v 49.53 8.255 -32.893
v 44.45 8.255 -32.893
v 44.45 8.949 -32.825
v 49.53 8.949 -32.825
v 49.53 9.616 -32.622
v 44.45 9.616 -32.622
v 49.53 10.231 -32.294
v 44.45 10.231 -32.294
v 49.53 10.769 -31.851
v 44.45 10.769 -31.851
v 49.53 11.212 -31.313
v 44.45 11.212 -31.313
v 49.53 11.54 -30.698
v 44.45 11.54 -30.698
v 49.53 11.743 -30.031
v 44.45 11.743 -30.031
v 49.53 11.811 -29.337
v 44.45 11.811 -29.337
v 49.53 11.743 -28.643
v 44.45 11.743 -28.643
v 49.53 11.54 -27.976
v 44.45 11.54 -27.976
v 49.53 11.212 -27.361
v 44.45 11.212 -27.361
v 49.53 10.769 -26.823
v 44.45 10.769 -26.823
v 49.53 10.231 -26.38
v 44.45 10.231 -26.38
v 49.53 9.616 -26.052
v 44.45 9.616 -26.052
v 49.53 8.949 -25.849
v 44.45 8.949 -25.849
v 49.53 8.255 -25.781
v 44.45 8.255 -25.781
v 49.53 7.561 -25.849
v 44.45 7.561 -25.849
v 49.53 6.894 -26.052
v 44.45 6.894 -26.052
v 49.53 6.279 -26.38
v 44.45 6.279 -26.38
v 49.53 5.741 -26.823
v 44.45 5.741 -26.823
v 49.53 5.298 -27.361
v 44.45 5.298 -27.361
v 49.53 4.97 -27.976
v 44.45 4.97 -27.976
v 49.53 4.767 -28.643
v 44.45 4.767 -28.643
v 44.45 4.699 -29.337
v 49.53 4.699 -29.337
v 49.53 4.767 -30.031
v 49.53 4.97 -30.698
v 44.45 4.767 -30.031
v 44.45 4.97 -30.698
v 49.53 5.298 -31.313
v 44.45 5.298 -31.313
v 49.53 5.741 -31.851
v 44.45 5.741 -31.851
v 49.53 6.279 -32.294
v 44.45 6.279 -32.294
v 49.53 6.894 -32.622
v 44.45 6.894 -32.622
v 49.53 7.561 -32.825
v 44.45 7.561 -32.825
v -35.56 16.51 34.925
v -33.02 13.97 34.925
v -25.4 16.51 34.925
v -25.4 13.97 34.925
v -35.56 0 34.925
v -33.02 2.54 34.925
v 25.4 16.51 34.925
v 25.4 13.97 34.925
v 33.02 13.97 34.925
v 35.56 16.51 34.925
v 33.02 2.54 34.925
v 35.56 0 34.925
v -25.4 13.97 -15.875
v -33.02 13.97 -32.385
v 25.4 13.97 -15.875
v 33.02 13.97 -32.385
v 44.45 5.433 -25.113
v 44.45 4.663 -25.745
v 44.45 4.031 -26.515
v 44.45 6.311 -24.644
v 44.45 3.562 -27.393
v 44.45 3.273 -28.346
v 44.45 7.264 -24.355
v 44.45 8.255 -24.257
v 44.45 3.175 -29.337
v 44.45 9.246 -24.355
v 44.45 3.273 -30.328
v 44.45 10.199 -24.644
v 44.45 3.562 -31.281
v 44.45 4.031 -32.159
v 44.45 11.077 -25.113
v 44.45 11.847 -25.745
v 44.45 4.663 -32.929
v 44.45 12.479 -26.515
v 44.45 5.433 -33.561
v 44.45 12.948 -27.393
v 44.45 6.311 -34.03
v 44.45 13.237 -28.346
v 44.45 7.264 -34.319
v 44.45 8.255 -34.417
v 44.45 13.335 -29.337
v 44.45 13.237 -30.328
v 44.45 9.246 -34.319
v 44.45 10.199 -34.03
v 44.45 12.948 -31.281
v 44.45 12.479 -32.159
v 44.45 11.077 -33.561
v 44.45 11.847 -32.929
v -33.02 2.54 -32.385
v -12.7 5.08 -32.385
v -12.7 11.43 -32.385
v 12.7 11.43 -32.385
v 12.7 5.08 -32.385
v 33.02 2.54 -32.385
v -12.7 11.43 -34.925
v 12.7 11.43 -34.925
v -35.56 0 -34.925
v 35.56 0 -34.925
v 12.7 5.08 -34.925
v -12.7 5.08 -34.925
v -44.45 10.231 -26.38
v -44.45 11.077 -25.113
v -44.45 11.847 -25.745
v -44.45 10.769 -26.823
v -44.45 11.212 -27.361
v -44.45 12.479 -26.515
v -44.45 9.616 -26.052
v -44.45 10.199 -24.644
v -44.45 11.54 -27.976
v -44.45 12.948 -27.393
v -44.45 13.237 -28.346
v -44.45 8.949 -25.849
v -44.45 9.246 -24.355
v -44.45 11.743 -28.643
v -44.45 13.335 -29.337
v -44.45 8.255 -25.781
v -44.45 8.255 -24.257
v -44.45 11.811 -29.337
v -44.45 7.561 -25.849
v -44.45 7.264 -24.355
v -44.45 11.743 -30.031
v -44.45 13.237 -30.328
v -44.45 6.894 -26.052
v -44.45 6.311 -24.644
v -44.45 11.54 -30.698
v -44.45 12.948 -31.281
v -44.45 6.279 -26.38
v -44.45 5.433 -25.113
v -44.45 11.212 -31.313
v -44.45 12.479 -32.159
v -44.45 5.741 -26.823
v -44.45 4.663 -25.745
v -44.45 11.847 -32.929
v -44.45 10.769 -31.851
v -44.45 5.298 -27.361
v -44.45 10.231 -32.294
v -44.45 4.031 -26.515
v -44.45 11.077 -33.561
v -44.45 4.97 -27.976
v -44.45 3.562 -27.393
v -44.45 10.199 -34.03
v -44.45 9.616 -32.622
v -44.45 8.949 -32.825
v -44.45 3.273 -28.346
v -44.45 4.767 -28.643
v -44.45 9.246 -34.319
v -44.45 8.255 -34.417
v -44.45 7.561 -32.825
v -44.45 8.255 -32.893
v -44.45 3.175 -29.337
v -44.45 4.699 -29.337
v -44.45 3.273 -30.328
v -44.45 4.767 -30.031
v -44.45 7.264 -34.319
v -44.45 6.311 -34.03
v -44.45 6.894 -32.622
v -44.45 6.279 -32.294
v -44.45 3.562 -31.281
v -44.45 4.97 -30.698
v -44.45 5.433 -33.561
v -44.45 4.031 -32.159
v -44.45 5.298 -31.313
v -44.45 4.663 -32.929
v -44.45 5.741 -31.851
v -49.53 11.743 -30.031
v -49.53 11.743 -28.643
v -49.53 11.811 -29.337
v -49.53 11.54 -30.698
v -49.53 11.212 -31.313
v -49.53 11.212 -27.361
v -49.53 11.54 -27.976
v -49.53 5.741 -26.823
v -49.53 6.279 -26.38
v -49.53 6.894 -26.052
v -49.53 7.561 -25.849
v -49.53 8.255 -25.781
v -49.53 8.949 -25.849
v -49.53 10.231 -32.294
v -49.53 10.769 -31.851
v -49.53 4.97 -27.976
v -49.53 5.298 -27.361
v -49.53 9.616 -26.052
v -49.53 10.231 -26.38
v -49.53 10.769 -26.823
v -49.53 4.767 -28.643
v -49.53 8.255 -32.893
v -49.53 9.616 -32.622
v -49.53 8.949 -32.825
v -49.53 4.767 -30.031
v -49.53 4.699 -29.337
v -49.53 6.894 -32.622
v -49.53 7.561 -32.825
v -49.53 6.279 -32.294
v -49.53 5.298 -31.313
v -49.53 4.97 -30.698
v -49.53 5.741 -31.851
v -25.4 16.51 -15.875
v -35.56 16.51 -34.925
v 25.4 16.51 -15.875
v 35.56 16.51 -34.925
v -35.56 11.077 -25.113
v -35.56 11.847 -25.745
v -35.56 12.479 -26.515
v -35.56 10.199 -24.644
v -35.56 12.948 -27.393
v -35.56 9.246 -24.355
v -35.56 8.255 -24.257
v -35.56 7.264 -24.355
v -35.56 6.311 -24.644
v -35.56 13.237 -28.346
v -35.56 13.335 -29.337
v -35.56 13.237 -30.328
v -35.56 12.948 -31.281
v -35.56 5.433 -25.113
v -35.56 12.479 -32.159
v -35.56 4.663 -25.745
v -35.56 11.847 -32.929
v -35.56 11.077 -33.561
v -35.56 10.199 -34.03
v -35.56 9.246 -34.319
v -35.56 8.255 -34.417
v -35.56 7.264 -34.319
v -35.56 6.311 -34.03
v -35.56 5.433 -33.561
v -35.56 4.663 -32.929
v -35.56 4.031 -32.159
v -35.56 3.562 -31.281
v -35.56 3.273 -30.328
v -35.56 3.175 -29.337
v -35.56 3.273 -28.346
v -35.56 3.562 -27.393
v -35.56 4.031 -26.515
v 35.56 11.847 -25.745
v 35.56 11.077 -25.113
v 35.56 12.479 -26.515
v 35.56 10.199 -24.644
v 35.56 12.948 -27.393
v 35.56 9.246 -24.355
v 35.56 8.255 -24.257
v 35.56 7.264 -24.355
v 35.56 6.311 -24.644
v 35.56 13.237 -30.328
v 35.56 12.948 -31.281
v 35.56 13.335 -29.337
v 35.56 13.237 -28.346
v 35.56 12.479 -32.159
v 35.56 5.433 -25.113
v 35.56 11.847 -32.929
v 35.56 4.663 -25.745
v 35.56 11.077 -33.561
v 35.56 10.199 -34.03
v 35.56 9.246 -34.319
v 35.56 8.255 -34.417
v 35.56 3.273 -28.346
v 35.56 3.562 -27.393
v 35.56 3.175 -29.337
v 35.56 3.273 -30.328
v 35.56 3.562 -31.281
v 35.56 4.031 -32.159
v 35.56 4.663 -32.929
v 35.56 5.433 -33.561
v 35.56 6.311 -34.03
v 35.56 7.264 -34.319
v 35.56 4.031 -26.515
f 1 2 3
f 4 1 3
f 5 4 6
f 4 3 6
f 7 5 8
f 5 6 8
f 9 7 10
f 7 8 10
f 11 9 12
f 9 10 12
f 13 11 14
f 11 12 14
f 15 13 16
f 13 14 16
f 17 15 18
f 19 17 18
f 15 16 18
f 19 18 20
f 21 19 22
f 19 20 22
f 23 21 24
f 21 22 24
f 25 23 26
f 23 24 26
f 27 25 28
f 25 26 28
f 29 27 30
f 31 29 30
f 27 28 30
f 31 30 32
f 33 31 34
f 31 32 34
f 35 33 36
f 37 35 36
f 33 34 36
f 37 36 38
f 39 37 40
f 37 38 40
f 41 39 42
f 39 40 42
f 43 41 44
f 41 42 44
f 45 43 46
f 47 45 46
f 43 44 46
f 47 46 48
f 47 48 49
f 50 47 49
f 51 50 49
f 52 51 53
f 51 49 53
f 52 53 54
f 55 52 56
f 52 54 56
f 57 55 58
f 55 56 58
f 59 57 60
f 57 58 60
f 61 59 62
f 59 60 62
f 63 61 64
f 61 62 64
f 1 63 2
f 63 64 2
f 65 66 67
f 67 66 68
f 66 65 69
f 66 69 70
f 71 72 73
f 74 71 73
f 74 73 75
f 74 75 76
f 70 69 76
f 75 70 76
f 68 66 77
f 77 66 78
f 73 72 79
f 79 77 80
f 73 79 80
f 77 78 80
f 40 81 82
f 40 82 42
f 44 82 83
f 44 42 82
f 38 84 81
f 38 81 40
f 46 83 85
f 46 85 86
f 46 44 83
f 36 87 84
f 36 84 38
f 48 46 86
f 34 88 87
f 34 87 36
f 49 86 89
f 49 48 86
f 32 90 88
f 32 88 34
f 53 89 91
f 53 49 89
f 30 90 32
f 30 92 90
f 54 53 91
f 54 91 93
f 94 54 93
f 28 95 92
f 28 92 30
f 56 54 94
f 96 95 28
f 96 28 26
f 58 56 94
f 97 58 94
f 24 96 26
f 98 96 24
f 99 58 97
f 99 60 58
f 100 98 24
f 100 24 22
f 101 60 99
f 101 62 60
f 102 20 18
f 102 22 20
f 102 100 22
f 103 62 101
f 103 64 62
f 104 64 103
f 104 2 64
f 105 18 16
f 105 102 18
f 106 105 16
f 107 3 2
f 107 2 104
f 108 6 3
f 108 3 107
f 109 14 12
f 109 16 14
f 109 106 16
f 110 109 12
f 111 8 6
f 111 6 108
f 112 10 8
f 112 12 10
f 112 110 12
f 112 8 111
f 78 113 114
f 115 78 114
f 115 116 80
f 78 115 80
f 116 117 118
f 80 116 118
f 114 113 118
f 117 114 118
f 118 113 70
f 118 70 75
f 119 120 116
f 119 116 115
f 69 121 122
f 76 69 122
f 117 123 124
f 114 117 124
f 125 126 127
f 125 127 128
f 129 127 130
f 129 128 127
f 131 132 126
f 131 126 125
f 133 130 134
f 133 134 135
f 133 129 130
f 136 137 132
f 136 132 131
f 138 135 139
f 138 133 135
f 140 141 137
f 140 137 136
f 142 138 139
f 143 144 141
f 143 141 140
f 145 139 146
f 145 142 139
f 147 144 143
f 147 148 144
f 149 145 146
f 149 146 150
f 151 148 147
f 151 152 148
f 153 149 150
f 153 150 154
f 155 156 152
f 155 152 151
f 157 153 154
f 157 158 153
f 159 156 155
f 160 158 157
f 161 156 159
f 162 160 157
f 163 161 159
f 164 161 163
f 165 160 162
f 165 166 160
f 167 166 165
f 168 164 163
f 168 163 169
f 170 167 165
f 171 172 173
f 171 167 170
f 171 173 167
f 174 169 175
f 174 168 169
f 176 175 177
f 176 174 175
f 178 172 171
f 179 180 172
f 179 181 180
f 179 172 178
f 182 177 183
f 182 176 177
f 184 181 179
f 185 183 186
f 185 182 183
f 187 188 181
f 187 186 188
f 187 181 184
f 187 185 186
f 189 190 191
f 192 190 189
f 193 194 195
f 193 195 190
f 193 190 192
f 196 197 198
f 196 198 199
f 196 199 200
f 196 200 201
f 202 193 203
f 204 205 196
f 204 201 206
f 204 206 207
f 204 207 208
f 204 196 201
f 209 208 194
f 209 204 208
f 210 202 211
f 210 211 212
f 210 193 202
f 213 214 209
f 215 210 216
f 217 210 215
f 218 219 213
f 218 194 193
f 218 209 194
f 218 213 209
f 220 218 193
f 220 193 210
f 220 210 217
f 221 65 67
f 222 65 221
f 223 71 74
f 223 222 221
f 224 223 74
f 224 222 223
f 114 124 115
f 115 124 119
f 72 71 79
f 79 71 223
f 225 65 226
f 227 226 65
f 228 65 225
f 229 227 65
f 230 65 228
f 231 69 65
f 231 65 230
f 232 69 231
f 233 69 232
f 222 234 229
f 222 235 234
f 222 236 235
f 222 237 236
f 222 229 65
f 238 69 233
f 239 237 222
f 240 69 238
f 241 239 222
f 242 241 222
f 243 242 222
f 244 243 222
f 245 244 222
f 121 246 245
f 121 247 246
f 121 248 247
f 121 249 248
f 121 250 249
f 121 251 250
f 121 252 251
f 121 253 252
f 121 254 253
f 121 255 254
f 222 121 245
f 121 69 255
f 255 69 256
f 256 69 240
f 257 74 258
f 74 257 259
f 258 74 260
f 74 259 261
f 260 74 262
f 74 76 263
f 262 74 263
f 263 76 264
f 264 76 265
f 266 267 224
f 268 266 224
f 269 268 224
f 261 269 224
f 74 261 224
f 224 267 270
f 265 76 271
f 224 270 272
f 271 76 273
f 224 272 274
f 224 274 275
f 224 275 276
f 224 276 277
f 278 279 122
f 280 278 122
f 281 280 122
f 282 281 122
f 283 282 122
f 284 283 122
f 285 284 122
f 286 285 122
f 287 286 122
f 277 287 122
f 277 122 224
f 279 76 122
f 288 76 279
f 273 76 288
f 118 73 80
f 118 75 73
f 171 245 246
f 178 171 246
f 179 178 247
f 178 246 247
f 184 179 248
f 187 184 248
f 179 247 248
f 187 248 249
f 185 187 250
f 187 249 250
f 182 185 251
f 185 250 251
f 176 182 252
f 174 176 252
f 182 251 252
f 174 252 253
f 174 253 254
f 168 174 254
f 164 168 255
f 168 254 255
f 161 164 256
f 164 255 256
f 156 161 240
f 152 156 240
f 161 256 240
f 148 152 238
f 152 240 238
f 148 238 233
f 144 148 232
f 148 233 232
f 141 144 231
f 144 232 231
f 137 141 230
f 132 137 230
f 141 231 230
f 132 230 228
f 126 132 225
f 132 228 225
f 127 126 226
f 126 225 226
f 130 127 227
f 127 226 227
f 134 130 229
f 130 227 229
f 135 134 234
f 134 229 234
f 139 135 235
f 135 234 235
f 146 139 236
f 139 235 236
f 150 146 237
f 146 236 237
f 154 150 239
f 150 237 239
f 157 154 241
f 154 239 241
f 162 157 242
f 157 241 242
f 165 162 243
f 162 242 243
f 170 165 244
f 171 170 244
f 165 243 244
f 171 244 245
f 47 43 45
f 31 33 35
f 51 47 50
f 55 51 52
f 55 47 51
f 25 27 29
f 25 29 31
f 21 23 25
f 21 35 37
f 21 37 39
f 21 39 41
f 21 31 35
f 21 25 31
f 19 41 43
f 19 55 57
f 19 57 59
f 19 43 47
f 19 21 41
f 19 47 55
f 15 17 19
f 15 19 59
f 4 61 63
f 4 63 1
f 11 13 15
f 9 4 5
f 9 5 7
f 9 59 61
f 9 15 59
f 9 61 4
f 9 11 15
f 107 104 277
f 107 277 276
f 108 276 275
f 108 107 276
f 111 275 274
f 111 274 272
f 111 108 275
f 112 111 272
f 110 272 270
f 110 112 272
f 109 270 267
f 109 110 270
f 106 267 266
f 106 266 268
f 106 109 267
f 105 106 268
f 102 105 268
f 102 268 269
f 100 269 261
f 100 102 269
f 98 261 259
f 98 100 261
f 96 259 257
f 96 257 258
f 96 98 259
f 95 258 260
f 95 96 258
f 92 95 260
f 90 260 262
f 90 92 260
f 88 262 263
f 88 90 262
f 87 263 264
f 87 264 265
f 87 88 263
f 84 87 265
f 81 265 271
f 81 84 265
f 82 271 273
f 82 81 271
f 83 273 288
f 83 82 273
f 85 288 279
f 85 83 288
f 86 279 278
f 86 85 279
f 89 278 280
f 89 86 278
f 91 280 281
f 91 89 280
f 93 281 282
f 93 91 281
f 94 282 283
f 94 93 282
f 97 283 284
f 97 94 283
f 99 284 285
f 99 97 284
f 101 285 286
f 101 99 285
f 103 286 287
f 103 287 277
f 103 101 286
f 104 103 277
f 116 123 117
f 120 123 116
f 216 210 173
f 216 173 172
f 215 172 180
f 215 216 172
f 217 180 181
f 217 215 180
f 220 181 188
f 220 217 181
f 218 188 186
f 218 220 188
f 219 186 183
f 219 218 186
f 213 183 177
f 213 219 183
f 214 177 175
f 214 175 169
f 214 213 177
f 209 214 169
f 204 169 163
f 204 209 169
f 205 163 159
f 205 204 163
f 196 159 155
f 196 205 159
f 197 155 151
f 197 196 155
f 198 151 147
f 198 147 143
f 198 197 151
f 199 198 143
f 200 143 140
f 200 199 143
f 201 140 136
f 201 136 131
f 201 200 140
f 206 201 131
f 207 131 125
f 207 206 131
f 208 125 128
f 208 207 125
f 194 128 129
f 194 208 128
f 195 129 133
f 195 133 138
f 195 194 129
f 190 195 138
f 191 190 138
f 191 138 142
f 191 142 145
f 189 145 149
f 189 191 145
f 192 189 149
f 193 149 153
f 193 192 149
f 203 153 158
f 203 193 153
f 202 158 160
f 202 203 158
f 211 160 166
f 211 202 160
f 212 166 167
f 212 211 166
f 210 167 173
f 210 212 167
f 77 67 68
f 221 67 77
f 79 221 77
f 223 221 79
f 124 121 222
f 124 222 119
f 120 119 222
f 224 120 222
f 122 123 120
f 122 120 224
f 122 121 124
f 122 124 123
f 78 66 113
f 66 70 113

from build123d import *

# Parameters (mm, degrees)
SKETCH1_W           = 71.12
SKETCH1_H           = 69.85
BOSS_EXTRUDE1_DEPTH = 16.51
SHELL1_T            = -2.54
SKETCH4_R           = 5.08
BOSS_EXTRUDE2_DEPTH = 8.89
BOSS_EXTRUDE3_START = 8.89
SKETCH3_R           = 5.08
BOSS_EXTRUDE3_DEPTH = 8.89
SKETCH6_R           = 3.556
BOSS_EXTRUDE4_DEPTH = 5.08
BOSS_EXTRUDE5_START = 5.08
SKETCH5_R           = 3.556
BOSS_EXTRUDE5_DEPTH = 5.08
SKETCH7_W           = 50.8
SKETCH7_H           = 50.8
CUT_EXTRUDE1_DEPTH  = 2.54
SKETCH8_W           = 25.4
SKETCH8_H           = 6.35
CUT_EXTRUDE2_DEPTH  = 2.54


with BuildPart() as part:
    # Sketch1 → Boss-Extrude1 (new body)
    with BuildSketch(Plane(origin=(0, 0, 0), x_dir=(1, 0, 0), z_dir=(0, 1, 0))):
        Rectangle(SKETCH1_W, SKETCH1_H)
    extrude(amount=BOSS_EXTRUDE1_DEPTH)

    # Shell1
    shell1_openings = [part.faces().sort_by_distance(p)[0] for p in [
        (0, 8.255, 34.925),
    ]]
    offset(amount=SHELL1_T, openings=shell1_openings, kind=Kind.INTERSECTION)

    # Sketch4 → Boss-Extrude2 (add)
    with BuildSketch(Plane.ZY.offset(35.56)):
        with Locations(Location((-29.337, 8.255, 0), (0, 0, 180))):
            Circle(SKETCH4_R)
    extrude(amount=BOSS_EXTRUDE2_DEPTH)

    # Sketch3 → Boss-Extrude3 (add)
    with BuildSketch(Plane(origin=(35.56, 0, 0), x_dir=(0, 0, -1), z_dir=(1, 0, 0)).offset(BOSS_EXTRUDE3_START)):
        with Locations((29.337, 8.255)):
            Circle(SKETCH3_R)
    extrude(amount=-BOSS_EXTRUDE3_DEPTH)

    # Sketch6 → Boss-Extrude4 (add)
    with BuildSketch(Plane(origin=(44.45, 0, 0), x_dir=(0, 0, -1), z_dir=(1, 0, 0))):
        with Locations((29.337, 8.255)):
            Circle(SKETCH6_R)
    extrude(amount=BOSS_EXTRUDE4_DEPTH)

    # Sketch5 → Boss-Extrude5 (add)
    with BuildSketch(Plane.ZY.offset(44.45).offset(BOSS_EXTRUDE5_START)):
        with Locations(Location((-29.337, 8.255, 0), (0, 0, 180))):
            Circle(SKETCH5_R)
    extrude(amount=-BOSS_EXTRUDE5_DEPTH)

    # Sketch7 → Cut-Extrude1 (cut)
    with BuildSketch(Plane(origin=(0, 16.51, 0), x_dir=(1, 0, 0), z_dir=(0, 1, 0))):
        with Locations((0, -9.525)):
            Rectangle(SKETCH7_W, SKETCH7_H)
    extrude(amount=-CUT_EXTRUDE1_DEPTH, mode=Mode.SUBTRACT)

    # Sketch8 → Cut-Extrude2 (cut)
    with BuildSketch(Plane(origin=(0, 0, -34.925), x_dir=(-1, 0, 0), z_dir=(0, 0, -1))):
        with Locations((0, 8.255)):
            Rectangle(SKETCH8_W, SKETCH8_H)
    extrude(amount=-CUT_EXTRUDE2_DEPTH, mode=Mode.SUBTRACT)


solid = part.part
